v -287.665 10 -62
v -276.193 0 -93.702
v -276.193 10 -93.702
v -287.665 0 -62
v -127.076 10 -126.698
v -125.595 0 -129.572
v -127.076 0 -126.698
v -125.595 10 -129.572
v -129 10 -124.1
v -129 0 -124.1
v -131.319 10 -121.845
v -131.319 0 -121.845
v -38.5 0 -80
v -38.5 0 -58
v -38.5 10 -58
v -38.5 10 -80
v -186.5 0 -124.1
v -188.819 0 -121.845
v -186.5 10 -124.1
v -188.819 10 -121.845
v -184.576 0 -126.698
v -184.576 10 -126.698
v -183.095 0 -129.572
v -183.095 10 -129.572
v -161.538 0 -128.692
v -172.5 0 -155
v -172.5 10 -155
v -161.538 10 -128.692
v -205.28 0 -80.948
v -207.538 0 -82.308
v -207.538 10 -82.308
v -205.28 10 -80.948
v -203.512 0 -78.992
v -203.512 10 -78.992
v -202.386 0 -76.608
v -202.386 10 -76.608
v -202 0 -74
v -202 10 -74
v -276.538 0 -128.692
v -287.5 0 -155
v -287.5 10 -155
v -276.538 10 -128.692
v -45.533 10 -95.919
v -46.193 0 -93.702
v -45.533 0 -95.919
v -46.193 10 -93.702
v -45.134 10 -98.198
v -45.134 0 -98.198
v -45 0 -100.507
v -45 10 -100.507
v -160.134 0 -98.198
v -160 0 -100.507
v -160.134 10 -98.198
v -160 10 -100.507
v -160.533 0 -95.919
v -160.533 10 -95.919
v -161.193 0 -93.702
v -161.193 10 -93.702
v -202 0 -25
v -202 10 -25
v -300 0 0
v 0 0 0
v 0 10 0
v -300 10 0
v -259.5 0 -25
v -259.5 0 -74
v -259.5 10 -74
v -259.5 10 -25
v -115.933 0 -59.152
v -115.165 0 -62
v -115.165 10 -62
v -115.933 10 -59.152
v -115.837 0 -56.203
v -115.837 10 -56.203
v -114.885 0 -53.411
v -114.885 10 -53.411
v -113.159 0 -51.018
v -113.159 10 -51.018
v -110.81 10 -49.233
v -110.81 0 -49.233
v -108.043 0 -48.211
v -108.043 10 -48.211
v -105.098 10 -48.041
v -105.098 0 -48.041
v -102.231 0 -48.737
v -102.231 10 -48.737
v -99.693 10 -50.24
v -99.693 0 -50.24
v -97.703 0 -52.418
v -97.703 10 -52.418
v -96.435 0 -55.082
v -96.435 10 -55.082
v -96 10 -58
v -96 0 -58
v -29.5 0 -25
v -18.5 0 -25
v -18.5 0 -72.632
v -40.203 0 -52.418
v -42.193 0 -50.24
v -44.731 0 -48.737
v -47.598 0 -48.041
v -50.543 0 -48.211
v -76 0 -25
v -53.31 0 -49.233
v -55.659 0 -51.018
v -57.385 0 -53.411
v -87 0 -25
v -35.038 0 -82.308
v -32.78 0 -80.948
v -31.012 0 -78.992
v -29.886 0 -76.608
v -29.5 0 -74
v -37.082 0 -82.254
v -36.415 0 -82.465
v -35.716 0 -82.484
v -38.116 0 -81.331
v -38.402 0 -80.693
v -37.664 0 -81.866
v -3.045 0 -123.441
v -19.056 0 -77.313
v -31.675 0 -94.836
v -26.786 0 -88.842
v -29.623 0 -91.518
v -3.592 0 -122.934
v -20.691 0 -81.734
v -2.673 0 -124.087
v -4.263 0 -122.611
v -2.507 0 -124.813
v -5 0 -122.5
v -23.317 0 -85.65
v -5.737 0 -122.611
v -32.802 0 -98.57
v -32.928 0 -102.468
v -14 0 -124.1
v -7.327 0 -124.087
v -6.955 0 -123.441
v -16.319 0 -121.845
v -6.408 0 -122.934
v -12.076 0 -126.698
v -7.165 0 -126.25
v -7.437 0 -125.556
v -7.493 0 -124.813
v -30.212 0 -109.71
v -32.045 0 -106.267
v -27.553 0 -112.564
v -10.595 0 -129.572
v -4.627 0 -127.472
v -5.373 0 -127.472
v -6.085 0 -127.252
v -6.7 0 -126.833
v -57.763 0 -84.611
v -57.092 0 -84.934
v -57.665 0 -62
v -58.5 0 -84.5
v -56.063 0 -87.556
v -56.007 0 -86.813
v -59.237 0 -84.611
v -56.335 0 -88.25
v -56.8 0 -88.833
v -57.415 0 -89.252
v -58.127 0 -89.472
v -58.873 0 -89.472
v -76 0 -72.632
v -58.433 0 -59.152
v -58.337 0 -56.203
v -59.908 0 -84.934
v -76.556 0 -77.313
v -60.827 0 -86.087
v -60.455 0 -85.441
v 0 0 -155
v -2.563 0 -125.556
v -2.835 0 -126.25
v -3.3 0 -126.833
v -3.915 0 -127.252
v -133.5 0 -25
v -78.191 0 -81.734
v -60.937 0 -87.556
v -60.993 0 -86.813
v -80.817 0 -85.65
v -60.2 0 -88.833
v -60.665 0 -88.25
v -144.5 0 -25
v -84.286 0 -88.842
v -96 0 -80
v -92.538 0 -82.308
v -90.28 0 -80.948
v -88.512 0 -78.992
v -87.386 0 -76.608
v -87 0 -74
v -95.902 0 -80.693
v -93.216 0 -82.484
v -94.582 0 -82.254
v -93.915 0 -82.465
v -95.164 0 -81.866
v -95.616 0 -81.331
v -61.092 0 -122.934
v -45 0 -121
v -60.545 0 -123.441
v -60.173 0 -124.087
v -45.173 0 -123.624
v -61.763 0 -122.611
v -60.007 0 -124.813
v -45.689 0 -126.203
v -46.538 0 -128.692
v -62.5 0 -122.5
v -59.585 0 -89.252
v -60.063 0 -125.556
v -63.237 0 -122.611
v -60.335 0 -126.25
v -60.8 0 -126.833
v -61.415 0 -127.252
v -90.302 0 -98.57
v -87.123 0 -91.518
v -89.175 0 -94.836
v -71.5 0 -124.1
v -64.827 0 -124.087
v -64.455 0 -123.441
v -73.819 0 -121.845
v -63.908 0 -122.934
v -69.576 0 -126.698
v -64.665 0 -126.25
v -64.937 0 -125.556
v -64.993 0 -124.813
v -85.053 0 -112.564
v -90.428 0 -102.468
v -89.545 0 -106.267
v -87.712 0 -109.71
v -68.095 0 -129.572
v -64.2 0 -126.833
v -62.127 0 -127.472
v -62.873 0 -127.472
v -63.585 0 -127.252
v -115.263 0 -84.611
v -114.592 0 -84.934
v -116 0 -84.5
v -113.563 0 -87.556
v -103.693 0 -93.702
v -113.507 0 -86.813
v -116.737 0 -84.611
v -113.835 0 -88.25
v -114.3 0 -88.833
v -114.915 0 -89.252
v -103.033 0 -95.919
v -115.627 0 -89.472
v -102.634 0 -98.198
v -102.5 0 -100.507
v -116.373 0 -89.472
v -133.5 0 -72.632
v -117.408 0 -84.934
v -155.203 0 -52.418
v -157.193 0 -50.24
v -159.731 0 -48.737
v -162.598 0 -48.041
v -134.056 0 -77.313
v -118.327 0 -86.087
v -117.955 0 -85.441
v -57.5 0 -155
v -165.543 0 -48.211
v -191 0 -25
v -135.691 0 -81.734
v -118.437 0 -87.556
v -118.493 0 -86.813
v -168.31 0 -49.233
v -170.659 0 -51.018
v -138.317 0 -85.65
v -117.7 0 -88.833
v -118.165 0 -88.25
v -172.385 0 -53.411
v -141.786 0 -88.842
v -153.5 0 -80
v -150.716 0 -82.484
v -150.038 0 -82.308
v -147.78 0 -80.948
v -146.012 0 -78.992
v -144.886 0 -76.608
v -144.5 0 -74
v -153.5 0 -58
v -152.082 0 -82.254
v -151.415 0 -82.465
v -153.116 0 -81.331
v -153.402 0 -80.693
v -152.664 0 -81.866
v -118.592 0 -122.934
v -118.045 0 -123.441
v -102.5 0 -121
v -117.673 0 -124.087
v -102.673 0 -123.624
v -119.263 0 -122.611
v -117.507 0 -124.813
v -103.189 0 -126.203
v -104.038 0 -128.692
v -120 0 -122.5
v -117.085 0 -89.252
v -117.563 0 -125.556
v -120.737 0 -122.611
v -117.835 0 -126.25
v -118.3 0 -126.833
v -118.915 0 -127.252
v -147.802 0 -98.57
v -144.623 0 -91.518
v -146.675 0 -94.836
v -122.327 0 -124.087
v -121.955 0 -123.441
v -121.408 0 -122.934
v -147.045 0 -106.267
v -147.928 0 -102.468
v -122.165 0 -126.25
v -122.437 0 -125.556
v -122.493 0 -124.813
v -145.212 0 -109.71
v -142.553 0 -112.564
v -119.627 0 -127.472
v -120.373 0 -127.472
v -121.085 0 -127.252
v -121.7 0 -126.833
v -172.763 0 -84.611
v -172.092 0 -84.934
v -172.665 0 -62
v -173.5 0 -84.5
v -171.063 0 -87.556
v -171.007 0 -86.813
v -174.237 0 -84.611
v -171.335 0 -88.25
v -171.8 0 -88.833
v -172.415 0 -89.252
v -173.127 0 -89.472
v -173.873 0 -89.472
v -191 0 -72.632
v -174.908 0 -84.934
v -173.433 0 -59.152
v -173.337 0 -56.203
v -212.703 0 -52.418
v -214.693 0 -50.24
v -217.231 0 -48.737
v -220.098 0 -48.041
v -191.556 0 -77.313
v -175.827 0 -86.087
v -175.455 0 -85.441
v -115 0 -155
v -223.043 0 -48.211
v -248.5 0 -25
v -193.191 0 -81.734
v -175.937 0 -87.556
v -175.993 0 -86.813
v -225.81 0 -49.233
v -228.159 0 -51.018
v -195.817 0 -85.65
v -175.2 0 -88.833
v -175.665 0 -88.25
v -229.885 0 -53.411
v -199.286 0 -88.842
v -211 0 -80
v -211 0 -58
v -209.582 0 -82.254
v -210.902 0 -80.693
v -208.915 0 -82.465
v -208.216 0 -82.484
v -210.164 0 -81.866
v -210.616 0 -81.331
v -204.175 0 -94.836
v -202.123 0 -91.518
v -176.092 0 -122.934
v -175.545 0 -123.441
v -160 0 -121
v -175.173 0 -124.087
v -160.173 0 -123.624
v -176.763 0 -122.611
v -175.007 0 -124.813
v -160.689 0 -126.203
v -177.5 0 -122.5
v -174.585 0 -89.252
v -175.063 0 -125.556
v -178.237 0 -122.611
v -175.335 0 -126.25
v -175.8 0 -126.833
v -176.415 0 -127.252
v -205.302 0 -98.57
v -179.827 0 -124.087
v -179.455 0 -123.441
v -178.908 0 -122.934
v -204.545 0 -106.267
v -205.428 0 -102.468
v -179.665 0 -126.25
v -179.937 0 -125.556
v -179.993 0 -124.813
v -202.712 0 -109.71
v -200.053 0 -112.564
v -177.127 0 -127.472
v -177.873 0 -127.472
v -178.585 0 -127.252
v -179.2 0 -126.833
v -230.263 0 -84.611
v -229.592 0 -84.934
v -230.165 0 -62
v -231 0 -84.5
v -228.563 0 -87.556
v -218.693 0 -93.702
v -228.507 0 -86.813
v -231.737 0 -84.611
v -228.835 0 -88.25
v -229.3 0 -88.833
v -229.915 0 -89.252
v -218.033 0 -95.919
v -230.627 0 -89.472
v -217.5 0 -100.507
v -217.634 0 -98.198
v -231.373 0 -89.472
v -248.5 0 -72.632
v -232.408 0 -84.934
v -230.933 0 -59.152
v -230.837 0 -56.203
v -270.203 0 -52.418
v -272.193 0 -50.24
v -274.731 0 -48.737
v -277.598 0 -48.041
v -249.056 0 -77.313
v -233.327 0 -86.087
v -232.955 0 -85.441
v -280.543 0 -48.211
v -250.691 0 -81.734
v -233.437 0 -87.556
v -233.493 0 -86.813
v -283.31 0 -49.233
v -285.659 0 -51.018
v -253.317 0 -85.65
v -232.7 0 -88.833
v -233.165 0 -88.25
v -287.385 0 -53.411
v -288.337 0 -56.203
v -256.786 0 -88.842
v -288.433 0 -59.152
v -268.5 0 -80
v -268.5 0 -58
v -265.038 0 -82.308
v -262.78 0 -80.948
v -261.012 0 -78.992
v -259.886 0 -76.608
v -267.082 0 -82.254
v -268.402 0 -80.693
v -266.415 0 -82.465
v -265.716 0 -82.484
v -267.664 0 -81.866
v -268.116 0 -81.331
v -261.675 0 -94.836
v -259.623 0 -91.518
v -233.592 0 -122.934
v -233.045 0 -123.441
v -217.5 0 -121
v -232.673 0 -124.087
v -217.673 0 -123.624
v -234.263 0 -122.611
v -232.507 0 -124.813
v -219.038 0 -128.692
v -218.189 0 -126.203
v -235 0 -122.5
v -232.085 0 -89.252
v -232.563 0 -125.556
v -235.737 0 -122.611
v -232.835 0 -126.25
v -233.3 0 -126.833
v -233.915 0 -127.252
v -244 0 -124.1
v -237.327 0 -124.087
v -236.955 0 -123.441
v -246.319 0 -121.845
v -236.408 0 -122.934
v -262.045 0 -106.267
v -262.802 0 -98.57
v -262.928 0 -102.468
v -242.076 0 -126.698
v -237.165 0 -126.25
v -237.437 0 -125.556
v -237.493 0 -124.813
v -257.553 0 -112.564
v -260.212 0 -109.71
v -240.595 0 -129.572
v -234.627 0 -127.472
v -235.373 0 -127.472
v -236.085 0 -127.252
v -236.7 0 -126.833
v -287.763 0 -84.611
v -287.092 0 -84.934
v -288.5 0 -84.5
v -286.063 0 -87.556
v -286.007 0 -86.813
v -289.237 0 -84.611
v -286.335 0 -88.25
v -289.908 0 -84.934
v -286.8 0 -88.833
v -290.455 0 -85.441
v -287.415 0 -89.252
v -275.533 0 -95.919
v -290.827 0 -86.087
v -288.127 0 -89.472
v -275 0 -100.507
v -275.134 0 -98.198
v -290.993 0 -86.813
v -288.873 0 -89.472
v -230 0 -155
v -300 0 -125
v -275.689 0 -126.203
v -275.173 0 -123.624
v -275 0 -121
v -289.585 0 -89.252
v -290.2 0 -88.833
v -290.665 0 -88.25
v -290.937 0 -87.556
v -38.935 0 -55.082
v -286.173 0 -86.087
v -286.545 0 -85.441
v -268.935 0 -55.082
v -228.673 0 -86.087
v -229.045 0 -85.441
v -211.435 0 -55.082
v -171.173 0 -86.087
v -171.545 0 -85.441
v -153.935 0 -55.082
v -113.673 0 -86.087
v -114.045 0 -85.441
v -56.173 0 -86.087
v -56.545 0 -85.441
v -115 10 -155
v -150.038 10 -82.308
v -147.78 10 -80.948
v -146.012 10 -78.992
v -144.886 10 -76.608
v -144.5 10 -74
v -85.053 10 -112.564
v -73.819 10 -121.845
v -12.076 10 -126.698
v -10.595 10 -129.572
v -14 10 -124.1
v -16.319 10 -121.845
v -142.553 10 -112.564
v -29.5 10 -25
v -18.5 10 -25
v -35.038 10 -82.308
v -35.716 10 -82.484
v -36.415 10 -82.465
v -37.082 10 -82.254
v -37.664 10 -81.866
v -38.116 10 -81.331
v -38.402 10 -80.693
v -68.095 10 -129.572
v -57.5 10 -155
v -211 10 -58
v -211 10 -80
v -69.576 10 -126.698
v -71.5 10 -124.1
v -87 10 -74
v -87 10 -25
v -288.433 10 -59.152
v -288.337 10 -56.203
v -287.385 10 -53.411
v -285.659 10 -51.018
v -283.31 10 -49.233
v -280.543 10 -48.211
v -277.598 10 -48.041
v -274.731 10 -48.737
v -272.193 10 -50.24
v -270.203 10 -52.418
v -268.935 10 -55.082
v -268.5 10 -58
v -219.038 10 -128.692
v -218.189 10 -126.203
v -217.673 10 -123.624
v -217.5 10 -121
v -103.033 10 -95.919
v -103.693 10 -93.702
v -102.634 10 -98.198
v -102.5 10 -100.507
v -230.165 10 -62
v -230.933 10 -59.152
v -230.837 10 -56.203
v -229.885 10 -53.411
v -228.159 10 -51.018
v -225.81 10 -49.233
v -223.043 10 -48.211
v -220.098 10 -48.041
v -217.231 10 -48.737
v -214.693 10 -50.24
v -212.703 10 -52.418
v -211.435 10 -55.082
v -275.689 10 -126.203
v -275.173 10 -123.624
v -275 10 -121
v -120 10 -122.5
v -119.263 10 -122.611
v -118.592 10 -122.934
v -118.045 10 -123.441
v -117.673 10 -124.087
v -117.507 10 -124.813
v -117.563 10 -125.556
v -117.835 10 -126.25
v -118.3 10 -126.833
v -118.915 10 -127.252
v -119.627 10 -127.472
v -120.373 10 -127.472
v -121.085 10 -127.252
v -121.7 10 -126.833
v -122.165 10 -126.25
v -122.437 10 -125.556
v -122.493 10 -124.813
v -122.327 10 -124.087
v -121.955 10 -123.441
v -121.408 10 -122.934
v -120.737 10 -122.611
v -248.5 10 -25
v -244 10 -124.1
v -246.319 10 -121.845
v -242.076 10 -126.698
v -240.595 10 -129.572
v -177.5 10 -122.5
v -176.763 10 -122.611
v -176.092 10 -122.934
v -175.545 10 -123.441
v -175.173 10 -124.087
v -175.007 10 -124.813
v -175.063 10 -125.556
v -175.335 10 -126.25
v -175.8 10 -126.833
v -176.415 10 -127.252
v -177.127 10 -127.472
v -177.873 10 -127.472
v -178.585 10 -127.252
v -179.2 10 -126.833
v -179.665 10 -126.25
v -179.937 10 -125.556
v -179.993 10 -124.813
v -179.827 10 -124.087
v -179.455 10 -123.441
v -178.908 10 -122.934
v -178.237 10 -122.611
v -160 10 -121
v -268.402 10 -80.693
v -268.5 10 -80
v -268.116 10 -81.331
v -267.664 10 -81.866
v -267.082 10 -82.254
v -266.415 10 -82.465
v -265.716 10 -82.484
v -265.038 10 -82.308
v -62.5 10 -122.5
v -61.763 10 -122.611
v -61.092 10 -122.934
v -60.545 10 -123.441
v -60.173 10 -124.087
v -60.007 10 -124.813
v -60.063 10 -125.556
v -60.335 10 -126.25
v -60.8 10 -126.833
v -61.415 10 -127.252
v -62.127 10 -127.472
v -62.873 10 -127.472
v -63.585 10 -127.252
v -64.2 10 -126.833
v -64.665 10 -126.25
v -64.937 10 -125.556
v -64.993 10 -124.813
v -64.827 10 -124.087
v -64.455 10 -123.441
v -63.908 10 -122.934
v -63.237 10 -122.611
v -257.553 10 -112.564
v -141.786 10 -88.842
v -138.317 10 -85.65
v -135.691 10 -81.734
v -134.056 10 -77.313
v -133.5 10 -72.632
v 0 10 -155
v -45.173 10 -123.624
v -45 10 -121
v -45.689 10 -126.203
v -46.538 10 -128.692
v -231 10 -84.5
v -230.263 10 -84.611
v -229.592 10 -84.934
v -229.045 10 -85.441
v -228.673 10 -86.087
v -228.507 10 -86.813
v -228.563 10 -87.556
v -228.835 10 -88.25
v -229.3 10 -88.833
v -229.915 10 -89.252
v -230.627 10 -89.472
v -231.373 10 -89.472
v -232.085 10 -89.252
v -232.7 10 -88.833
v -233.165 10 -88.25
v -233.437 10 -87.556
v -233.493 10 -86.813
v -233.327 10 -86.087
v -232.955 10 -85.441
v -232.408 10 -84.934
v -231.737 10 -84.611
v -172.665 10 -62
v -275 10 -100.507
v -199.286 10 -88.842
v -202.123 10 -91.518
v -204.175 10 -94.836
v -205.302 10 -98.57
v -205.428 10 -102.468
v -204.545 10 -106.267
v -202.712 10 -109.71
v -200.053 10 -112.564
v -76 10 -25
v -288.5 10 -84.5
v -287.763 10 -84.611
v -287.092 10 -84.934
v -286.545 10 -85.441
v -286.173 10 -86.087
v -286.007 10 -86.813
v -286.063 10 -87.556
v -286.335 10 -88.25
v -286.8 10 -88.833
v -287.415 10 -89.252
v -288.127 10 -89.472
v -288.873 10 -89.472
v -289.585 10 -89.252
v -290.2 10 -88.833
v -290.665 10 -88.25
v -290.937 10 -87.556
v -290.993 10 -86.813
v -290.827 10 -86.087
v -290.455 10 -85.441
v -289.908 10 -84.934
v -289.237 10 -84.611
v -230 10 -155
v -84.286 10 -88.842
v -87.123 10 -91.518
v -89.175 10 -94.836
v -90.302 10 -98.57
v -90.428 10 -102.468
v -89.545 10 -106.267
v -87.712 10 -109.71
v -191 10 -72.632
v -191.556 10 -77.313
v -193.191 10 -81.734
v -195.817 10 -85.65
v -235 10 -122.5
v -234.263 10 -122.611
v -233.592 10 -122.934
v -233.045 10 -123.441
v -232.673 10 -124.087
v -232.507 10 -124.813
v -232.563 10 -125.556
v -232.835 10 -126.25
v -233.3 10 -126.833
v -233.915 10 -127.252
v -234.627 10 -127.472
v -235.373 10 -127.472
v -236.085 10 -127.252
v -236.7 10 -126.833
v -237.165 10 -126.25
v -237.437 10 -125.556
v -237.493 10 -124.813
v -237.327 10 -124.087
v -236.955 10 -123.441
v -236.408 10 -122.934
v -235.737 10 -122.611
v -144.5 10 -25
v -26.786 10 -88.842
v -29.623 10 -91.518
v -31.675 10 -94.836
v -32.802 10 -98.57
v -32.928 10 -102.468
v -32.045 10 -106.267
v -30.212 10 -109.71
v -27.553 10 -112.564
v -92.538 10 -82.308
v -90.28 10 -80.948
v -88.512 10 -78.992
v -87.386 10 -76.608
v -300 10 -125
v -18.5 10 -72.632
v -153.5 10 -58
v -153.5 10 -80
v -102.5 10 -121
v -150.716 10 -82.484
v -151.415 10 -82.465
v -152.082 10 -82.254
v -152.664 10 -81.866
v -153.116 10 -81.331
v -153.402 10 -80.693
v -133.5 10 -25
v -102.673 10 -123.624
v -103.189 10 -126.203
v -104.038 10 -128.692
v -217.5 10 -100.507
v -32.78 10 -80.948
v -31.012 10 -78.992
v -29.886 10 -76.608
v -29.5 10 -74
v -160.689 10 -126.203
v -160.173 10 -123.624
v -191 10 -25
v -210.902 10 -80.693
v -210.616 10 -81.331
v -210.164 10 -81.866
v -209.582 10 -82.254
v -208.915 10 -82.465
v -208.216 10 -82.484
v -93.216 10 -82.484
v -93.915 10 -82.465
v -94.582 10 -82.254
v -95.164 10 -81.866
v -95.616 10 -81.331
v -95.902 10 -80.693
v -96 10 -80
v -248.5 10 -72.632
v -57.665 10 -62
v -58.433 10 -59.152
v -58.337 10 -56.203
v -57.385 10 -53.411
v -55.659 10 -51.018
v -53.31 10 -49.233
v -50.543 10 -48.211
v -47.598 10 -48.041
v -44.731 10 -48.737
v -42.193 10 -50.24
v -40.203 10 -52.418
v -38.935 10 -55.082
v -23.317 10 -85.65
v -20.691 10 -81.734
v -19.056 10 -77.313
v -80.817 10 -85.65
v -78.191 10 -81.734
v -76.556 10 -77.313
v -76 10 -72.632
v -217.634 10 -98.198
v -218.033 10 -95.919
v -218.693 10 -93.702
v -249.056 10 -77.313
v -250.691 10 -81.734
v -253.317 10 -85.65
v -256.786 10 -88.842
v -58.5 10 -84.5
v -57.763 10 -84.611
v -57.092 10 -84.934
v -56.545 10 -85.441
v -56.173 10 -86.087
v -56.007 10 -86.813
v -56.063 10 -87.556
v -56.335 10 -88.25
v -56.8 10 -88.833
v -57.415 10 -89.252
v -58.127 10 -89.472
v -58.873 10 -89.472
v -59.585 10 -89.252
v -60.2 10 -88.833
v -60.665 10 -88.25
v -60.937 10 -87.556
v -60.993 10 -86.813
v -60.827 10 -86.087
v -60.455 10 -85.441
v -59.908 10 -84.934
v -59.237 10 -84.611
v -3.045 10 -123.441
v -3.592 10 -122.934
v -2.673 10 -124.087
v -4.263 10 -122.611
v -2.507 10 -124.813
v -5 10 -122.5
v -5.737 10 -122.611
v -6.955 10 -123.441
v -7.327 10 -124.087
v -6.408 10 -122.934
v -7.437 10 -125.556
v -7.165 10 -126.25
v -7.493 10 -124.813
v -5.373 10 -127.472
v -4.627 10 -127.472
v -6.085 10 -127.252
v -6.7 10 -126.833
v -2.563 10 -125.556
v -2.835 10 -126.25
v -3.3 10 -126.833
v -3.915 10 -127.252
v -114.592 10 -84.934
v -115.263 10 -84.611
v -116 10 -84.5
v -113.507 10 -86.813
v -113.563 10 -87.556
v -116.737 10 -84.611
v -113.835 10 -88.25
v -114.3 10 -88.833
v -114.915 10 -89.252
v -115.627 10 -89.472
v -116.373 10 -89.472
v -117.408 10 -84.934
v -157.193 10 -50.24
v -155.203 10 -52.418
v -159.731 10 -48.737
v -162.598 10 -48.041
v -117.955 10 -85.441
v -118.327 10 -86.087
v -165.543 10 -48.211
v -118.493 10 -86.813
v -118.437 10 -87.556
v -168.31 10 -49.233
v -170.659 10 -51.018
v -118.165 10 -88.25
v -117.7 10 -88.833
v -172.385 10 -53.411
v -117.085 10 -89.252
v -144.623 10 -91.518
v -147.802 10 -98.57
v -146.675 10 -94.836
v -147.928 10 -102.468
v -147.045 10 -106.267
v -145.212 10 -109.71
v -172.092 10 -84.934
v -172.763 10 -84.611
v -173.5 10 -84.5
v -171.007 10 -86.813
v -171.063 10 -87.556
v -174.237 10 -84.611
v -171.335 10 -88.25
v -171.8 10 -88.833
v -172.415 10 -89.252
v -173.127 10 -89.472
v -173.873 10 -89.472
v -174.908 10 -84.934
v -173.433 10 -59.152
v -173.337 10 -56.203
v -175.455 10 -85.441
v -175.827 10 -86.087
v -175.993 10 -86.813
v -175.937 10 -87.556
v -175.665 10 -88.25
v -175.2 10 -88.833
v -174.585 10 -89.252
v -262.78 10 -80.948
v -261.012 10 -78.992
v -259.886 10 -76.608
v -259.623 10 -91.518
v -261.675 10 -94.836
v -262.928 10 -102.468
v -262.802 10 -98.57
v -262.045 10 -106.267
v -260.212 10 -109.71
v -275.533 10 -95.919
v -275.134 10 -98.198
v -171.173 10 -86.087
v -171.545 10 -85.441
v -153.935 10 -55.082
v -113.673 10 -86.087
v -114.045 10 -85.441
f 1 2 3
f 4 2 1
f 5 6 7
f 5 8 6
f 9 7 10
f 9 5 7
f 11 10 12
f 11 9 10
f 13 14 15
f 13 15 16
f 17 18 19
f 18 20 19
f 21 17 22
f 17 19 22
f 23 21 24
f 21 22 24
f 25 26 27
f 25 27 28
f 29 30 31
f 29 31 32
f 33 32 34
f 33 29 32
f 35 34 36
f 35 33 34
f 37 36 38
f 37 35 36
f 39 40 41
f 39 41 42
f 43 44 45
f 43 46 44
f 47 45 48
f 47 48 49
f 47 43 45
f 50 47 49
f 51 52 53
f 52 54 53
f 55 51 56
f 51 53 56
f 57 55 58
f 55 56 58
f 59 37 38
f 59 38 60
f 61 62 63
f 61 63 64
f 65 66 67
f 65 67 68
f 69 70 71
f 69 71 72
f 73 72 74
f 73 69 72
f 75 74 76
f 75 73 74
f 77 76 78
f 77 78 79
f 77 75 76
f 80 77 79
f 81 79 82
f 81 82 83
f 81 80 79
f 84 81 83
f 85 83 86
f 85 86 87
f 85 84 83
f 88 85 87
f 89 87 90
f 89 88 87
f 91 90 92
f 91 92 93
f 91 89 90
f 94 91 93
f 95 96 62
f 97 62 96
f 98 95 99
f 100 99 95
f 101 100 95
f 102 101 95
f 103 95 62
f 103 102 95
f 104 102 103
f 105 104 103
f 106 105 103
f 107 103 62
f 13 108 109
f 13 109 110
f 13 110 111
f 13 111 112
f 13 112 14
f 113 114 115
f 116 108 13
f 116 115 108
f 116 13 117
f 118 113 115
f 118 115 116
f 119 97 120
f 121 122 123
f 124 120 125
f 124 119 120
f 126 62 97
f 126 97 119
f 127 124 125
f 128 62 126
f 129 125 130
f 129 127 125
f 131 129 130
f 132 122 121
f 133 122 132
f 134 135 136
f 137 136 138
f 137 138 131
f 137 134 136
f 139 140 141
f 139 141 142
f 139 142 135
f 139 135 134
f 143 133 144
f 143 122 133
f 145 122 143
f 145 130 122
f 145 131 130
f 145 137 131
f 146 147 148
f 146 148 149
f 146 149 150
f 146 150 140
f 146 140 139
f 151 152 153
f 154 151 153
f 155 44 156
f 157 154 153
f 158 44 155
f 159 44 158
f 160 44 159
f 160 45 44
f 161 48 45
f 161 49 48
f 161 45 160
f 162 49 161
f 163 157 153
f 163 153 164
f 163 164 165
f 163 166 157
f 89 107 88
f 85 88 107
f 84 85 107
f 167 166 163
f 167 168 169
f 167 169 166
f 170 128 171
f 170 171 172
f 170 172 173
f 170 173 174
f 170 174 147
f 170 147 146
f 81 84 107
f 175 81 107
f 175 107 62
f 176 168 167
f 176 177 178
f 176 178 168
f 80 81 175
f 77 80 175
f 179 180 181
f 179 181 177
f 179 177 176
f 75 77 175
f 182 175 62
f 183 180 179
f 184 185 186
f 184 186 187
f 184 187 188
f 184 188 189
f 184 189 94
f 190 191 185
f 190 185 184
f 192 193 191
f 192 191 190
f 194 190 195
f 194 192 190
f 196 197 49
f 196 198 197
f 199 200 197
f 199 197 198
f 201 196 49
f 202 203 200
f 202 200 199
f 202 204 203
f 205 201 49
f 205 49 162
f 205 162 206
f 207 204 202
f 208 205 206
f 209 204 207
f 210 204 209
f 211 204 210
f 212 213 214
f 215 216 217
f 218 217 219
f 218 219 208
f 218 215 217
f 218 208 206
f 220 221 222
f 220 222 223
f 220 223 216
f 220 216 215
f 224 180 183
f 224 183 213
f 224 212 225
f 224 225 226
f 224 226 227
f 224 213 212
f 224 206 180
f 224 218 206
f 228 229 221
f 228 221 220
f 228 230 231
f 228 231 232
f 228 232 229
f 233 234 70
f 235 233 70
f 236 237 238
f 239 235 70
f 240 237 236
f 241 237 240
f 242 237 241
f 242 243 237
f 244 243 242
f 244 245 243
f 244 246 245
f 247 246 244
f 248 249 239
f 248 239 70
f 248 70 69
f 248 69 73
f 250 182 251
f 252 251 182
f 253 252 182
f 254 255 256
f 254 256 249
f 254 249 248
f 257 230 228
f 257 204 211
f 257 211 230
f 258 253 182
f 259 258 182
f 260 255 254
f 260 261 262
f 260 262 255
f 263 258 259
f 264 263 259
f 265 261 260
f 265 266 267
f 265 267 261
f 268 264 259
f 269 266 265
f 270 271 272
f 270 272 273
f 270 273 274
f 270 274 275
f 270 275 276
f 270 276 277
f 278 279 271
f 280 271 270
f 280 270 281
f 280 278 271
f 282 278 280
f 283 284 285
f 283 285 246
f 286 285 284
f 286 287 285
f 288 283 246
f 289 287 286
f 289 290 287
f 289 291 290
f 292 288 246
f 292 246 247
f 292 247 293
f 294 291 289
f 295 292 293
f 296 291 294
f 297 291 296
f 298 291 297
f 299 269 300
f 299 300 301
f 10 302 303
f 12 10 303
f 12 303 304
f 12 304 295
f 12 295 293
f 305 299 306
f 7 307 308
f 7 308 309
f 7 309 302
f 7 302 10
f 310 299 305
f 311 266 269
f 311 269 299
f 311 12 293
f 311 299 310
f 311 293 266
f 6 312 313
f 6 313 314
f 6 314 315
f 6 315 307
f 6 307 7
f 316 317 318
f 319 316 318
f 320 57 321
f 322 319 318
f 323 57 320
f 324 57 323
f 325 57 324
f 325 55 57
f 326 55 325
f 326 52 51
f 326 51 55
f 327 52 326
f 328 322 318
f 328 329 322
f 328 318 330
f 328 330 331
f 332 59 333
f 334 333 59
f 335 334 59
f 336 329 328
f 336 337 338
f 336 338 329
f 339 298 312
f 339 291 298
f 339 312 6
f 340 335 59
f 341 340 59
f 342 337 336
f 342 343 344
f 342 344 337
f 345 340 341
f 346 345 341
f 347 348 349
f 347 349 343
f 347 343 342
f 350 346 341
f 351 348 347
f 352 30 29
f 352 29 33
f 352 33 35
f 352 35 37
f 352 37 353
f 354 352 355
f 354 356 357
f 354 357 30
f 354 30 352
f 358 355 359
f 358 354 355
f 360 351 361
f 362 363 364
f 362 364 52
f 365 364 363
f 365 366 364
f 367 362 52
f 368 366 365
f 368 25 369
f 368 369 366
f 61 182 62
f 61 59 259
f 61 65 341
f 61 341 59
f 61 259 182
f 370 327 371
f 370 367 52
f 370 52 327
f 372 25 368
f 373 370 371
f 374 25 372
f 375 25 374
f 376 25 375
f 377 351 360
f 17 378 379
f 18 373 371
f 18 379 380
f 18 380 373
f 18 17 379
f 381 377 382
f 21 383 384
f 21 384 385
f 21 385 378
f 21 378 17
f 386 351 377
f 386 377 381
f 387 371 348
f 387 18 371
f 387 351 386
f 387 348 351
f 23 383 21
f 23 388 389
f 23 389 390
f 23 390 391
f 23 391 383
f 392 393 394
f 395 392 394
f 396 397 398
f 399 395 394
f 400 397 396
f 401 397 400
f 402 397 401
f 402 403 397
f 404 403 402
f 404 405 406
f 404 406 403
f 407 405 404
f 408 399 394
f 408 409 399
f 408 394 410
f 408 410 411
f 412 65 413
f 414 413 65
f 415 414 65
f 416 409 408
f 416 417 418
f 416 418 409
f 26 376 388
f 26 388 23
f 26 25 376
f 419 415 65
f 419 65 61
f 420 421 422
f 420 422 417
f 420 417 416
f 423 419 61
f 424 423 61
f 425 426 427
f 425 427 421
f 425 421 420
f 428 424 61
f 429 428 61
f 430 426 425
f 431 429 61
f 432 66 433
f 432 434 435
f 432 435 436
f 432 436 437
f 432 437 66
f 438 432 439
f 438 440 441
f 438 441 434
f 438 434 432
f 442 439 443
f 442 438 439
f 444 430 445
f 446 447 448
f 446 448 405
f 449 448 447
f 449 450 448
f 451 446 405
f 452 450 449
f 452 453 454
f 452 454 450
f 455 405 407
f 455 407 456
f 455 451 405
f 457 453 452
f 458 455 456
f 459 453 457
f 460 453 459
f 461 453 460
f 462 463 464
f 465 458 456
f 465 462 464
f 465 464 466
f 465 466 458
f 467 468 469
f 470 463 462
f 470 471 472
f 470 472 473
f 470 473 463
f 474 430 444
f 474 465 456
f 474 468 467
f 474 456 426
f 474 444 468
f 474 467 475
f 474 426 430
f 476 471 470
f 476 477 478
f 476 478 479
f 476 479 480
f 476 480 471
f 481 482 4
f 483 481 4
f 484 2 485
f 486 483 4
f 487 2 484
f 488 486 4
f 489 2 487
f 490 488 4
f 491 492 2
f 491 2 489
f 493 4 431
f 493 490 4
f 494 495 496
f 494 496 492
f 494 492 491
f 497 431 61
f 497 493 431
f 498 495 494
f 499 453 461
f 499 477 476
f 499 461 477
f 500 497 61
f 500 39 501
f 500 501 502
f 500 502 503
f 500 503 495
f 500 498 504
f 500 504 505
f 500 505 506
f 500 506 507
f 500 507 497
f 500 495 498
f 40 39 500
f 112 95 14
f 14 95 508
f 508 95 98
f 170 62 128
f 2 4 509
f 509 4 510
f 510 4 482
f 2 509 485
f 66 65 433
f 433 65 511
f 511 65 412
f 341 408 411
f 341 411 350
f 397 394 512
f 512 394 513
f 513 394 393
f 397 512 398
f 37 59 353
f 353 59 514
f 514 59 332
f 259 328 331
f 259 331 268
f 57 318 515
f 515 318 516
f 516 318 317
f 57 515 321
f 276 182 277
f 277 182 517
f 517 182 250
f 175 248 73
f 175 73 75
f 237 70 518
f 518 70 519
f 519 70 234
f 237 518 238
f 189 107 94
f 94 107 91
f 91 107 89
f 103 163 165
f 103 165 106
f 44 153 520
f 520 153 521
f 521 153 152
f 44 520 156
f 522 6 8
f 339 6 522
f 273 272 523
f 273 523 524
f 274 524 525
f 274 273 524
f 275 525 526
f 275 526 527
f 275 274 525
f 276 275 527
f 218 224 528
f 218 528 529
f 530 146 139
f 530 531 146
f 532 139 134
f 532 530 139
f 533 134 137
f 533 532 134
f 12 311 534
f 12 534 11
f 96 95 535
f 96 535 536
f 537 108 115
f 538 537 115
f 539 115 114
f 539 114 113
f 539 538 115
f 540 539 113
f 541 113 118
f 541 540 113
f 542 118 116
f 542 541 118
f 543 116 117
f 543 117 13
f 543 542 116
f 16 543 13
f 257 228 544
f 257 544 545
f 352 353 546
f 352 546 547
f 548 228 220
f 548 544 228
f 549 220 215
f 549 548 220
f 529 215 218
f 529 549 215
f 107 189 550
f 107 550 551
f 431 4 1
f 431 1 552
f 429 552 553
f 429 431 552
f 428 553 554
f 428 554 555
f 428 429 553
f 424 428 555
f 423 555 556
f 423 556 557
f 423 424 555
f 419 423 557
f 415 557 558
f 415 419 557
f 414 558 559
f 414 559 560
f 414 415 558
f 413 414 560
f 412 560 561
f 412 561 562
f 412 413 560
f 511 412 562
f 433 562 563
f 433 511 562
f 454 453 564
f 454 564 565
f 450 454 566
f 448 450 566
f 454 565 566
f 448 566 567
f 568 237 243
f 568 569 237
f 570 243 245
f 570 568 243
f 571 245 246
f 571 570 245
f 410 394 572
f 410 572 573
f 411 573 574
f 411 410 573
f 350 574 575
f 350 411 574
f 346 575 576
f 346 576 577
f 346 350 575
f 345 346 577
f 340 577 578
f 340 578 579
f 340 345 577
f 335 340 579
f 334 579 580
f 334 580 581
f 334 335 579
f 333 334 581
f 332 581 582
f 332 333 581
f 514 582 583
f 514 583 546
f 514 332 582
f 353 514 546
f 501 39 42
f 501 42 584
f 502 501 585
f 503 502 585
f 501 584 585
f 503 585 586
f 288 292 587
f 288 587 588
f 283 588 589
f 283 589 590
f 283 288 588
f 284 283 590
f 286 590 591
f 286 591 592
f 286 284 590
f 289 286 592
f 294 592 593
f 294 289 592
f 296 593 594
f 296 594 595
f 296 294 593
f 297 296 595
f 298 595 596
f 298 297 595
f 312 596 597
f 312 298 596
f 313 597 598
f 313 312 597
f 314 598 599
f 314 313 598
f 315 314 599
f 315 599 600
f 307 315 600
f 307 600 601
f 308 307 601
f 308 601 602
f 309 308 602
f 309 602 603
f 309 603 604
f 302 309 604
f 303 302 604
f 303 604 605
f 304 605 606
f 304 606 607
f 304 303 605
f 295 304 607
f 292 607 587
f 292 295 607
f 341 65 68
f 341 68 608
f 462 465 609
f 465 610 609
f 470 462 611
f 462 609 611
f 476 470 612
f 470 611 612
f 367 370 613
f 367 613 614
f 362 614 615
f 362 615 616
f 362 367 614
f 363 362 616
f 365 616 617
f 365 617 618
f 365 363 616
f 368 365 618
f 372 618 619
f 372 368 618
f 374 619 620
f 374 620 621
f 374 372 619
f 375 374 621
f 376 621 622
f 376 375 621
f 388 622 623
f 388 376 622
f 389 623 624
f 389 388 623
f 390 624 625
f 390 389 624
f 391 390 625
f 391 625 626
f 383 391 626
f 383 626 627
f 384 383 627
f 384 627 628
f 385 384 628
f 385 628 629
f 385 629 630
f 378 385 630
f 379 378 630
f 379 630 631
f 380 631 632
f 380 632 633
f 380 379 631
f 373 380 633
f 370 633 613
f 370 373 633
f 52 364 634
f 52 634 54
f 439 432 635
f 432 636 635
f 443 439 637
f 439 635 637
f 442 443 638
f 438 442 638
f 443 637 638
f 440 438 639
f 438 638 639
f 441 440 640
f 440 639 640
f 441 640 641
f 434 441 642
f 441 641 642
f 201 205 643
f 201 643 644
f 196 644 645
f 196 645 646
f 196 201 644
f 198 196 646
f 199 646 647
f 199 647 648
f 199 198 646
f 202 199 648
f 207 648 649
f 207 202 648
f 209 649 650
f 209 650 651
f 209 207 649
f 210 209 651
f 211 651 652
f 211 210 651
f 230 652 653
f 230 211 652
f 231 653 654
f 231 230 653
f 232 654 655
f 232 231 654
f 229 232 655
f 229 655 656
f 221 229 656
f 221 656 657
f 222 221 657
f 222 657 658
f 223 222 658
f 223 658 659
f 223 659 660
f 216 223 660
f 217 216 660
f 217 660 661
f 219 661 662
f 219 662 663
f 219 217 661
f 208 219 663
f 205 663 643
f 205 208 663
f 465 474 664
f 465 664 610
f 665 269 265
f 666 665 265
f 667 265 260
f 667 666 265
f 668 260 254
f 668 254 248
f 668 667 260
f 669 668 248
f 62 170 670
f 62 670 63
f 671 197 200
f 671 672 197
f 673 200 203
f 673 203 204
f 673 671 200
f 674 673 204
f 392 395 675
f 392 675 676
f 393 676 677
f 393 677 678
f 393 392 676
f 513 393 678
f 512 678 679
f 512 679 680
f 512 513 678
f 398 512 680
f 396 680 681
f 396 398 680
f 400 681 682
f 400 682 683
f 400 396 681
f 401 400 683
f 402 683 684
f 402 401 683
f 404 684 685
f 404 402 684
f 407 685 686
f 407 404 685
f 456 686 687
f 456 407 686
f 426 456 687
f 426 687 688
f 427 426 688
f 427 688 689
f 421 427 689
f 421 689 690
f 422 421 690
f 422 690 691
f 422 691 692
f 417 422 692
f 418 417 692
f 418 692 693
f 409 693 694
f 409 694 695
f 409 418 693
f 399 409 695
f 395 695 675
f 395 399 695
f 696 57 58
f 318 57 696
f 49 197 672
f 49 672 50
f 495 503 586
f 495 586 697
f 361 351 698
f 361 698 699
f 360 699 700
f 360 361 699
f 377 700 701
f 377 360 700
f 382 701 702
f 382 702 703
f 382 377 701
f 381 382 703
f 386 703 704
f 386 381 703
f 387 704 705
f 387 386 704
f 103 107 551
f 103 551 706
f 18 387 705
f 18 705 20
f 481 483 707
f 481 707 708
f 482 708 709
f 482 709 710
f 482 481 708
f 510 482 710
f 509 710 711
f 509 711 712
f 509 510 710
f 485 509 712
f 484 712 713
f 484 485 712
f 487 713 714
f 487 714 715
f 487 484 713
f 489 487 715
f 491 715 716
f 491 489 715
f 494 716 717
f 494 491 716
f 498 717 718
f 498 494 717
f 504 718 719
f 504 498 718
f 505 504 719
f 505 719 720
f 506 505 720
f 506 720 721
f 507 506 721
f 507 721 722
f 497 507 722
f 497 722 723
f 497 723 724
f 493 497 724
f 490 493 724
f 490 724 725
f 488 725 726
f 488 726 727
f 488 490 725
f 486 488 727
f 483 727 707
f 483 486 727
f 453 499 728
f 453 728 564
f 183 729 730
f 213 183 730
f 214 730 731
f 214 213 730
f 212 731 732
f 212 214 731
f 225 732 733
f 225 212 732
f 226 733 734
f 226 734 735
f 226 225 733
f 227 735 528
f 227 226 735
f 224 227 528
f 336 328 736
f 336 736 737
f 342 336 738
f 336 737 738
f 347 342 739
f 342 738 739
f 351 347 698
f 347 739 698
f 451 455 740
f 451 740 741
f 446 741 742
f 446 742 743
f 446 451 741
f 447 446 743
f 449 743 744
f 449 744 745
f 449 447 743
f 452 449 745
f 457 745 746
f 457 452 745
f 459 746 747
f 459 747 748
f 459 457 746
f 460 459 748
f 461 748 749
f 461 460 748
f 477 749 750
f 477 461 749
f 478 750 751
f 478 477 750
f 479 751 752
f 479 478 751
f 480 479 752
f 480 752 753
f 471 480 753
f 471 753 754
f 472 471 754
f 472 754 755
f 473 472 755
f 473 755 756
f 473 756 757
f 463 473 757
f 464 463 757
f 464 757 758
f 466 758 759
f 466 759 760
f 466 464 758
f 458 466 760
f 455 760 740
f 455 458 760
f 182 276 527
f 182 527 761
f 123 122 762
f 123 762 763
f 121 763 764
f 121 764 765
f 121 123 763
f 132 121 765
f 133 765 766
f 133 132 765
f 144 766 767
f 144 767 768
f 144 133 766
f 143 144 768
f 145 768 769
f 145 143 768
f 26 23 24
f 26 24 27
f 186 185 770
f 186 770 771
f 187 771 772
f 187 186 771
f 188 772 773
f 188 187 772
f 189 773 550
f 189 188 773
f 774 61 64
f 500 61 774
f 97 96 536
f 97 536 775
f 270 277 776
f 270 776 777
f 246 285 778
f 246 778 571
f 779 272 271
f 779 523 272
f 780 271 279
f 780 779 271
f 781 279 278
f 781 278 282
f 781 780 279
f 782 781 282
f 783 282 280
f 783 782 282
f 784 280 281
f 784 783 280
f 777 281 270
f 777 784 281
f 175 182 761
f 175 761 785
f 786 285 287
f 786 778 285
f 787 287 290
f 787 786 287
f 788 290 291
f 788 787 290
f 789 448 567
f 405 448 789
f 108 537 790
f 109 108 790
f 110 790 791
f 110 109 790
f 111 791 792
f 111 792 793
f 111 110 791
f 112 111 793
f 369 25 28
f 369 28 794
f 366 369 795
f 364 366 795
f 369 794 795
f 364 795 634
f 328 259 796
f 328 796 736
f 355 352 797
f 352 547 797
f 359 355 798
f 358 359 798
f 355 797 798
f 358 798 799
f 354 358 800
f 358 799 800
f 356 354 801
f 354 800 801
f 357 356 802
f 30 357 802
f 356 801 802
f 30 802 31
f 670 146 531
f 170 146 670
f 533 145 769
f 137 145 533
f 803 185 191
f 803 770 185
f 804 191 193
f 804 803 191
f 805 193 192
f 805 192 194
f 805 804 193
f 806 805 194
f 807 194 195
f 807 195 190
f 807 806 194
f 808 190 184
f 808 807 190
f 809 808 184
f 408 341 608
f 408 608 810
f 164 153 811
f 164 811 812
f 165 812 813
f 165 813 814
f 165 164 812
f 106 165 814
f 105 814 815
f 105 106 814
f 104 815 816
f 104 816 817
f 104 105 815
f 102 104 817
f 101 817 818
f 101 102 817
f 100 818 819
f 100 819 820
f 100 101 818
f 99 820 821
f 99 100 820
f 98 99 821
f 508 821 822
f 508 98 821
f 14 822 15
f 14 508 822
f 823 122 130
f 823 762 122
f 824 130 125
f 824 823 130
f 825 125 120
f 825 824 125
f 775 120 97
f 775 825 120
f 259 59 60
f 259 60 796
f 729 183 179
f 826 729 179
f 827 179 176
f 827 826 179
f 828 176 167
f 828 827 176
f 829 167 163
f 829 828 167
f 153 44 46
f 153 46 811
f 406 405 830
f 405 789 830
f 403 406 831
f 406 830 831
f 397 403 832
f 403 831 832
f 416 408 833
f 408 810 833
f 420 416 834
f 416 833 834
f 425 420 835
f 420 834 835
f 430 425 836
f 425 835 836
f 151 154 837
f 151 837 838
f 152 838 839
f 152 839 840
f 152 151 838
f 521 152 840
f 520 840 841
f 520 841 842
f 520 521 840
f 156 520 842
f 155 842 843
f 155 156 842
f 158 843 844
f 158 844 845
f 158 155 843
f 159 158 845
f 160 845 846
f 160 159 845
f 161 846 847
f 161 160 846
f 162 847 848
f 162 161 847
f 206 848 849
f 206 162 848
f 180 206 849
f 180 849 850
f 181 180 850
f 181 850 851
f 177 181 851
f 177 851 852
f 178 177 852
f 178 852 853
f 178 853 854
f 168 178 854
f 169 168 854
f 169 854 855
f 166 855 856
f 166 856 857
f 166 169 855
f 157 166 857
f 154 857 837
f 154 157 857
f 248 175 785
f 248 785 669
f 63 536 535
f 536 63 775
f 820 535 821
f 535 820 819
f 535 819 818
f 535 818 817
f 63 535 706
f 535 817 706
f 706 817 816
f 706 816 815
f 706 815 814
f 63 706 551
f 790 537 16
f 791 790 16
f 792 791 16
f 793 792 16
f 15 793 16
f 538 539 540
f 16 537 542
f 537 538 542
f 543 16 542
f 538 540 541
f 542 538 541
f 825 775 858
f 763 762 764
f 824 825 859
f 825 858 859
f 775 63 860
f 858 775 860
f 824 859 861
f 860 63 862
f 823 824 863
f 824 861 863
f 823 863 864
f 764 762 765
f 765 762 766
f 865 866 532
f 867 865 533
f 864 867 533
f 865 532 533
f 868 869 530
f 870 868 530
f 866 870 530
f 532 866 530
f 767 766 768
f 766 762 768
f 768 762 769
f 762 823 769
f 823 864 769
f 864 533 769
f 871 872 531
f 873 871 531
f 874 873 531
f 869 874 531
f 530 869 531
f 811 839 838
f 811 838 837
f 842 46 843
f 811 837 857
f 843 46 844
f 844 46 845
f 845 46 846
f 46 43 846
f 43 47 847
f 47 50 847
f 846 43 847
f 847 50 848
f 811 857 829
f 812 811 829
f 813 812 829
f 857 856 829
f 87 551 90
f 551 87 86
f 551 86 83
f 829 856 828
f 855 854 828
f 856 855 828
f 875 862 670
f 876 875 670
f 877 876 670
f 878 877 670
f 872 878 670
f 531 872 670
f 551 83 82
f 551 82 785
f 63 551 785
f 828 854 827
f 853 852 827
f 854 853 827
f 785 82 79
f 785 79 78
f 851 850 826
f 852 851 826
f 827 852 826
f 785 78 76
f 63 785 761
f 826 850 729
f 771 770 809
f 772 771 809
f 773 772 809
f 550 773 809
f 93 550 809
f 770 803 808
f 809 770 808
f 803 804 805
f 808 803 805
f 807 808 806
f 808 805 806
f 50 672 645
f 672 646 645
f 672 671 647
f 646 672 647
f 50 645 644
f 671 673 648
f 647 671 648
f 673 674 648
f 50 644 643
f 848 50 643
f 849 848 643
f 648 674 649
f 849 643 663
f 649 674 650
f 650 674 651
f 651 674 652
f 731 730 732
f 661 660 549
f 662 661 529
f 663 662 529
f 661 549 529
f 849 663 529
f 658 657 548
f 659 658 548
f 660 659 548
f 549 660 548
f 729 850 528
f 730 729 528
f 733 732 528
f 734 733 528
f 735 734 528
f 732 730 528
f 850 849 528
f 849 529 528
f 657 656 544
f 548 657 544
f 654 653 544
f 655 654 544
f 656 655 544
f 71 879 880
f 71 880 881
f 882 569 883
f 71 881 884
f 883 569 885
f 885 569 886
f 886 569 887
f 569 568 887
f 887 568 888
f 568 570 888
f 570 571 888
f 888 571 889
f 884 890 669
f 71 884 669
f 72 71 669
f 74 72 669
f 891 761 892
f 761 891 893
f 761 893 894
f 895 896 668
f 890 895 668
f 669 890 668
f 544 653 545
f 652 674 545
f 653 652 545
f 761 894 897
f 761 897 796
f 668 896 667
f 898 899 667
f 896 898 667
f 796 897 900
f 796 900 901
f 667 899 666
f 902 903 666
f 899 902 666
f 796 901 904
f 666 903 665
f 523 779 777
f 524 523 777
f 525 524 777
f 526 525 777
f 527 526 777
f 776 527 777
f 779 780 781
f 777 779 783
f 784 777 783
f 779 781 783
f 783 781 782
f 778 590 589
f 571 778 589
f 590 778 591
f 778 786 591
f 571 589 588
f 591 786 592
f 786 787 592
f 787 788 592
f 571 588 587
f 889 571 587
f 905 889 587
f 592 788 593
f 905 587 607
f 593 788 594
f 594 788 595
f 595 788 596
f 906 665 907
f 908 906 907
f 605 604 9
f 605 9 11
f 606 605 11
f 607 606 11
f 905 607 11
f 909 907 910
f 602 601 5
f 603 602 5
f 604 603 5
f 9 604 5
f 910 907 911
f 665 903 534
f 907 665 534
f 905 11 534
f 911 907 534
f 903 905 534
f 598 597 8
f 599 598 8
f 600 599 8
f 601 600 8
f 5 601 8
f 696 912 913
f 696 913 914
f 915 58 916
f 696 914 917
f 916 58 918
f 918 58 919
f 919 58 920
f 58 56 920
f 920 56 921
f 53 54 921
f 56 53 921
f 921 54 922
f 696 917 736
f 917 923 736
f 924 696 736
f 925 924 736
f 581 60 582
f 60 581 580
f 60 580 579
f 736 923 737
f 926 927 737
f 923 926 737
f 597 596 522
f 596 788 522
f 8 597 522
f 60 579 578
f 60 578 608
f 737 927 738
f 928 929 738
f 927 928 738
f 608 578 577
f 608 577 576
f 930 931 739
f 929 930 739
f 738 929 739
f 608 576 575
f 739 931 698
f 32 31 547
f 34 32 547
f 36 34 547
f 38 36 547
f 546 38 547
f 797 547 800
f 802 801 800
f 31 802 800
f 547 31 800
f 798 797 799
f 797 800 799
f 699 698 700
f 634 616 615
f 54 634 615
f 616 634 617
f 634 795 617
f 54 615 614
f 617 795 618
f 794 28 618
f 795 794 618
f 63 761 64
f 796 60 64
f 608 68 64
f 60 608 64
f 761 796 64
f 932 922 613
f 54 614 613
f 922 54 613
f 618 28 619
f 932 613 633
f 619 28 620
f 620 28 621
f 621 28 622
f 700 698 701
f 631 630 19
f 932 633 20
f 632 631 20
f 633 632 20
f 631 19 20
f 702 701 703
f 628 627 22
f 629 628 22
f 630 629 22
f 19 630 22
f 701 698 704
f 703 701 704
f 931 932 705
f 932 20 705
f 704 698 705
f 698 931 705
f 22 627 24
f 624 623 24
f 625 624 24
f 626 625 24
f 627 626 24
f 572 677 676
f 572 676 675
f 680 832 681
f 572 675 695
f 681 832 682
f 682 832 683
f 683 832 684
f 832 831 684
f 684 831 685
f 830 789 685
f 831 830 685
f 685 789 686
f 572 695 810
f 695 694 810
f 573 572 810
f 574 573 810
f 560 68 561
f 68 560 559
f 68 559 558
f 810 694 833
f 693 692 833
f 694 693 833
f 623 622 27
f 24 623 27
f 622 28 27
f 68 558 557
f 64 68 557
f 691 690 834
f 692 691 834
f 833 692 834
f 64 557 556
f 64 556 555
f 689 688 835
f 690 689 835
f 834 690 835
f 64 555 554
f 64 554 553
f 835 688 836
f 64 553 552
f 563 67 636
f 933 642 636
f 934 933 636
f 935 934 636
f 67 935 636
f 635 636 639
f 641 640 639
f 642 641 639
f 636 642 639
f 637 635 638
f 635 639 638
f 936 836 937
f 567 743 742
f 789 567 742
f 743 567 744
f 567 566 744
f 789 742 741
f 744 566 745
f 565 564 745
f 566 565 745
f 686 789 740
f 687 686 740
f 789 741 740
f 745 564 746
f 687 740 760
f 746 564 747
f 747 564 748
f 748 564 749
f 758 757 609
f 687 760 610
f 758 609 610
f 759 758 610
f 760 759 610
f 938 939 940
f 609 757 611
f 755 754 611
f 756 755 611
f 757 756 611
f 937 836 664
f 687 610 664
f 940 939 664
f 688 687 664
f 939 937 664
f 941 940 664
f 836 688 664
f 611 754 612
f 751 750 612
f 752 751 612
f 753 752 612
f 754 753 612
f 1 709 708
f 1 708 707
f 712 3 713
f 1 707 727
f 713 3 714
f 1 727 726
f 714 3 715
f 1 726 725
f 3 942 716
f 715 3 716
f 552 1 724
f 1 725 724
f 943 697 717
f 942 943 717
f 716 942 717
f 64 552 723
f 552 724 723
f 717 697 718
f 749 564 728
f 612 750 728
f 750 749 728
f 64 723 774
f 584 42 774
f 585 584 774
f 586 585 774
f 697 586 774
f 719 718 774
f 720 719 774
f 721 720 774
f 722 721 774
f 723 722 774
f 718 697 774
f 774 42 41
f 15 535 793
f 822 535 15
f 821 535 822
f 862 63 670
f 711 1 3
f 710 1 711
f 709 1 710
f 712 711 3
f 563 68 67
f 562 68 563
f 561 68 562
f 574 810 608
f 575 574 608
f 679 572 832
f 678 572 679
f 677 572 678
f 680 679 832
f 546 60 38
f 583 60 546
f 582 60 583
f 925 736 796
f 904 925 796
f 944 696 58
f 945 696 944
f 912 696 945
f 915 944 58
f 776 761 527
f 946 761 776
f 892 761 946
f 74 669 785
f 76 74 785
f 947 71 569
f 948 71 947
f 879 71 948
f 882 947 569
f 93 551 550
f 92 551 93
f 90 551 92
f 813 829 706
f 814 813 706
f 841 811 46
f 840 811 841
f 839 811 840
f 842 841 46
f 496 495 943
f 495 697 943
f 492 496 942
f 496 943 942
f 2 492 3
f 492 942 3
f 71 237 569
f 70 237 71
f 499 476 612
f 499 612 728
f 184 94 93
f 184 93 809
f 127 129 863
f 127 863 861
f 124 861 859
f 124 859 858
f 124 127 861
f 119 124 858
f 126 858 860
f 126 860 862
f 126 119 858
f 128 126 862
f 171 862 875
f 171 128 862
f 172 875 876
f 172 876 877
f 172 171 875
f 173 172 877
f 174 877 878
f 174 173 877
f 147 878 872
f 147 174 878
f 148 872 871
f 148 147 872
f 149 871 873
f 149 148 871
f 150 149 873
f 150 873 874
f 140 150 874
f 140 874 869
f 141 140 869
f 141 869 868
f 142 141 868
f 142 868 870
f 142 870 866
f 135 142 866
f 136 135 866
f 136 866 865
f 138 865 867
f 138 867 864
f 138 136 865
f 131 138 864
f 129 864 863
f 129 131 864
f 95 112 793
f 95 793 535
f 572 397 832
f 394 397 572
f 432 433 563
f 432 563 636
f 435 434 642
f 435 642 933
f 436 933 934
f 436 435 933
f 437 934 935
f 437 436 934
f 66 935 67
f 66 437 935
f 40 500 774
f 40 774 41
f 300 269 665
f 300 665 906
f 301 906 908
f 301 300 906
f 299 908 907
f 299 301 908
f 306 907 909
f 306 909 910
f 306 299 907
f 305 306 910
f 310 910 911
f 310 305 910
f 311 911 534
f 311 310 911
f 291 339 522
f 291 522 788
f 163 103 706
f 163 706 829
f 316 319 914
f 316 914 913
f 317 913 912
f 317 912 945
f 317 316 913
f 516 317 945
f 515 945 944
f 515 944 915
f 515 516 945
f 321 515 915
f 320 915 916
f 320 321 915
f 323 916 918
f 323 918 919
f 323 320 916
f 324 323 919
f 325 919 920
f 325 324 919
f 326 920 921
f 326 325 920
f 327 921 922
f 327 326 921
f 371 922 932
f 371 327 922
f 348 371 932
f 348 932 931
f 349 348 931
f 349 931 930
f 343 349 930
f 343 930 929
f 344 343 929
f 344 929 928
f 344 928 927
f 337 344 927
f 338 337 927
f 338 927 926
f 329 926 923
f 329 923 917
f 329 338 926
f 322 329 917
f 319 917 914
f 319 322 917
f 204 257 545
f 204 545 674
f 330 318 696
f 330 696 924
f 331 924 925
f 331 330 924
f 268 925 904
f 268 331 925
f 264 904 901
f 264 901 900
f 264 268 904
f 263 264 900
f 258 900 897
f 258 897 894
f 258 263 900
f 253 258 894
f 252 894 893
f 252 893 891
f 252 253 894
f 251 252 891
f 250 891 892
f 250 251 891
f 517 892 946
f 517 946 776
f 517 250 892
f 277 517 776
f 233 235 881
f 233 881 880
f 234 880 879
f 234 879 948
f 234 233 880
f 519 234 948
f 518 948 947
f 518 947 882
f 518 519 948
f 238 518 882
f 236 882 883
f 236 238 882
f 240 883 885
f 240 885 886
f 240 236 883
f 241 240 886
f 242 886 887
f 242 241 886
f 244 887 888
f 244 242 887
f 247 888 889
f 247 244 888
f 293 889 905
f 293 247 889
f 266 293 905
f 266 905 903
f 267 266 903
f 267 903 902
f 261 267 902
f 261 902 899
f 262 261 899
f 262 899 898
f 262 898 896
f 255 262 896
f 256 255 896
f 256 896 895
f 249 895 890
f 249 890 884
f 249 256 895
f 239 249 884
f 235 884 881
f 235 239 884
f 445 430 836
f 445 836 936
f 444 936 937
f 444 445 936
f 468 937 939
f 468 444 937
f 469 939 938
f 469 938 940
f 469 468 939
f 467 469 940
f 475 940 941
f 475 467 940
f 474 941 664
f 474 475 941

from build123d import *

# Parameters (mm, degrees)
SKETCH1_R           = 2.5
BOSS_EXTRUDE1_DEPTH = 10
FILLET1_R           = 20
FILLET2_R           = 2.5


with BuildPart() as part:
    # Sketch1 → Boss-Extrude1 (new body)
    with BuildSketch(Plane(origin=(0, 0, 0), x_dir=(1, 0, 0), z_dir=(0, 1, 0))):
        with BuildLine():
            Line((0, 0), (-300, 0))
            Line((-300, 0), (-300, 125))
            Line((-300, 125), (-287.5, 155))
            Line((-287.5, 155), (-275, 125))
            Line((-275, 125), (-275, 97))
            Line((-275, 97), (-287.66515139, 62))
            ThreePointArc((-287.66515139, 62), (-280.543096437, 48.210936871), (-268.5, 58))
            Line((-268.5, 58), (-268.5, 83))
            ThreePointArc((-268.5, 83), (-262.136038969, 80.363961031), (-259.5, 74))
            Line((-259.5, 74), (-259.5, 25))
            Line((-259.5, 25), (-248.5, 25))
            Line((-248.5, 25), (-248.5, 86.008335649))
            ThreePointArc((-248.5, 86.008335649), (-262.197622342, 96.159801673), (-257.553360344, 112.564311745))
            Line((-257.553360344, 112.564311745), (-242.5, 125))
            Line((-242.5, 125), (-230, 155))
            Line((-230, 155), (-217.5, 125))
            Line((-217.5, 125), (-217.5, 97))
            Line((-217.5, 97), (-230.16515139, 62))
            ThreePointArc((-230.16515139, 62), (-223.043096437, 48.210936871), (-211, 58))
            Line((-211, 58), (-211, 83))
            ThreePointArc((-211, 83), (-204.636038969, 80.363961031), (-202, 74))
            Line((-202, 74), (-202, 25))
            Line((-202, 25), (-191, 25))
            Line((-191, 25), (-191, 86.008335649))
            ThreePointArc((-191, 86.008335649), (-204.697622342, 96.159801673), (-200.053360344, 112.564311745))
            Line((-200.053360344, 112.564311745), (-185, 125))
            Line((-185, 125), (-172.5, 155))
            Line((-172.5, 155), (-160, 125))
            Line((-160, 125), (-160, 97))
            Line((-160, 97), (-172.66515139, 62))
            ThreePointArc((-172.66515139, 62), (-165.543096437, 48.210936871), (-153.5, 58))
            Line((-153.5, 58), (-153.5, 83))
            ThreePointArc((-153.5, 83), (-147.136038969, 80.363961031), (-144.5, 74))
            Line((-144.5, 74), (-144.5, 25))
            Line((-144.5, 25), (-133.5, 25))
            Line((-133.5, 25), (-133.5, 86.008335649))
            ThreePointArc((-133.5, 86.008335649), (-147.197622342, 96.159801673), (-142.553360344, 112.564311745))
            Line((-142.553360344, 112.564311745), (-127.5, 125))
            Line((-127.5, 125), (-115, 155))
            Line((-115, 155), (-102.5, 125))
            Line((-102.5, 125), (-102.5, 97))
            Line((-102.5, 97), (-115.16515139, 62))
            ThreePointArc((-115.16515139, 62), (-108.043096437, 48.210936871), (-96, 58))
            Line((-96, 58), (-96, 83))
            ThreePointArc((-96, 83), (-89.636038969, 80.363961031), (-87, 74))
            Line((-87, 74), (-87, 25))
            Line((-87, 25), (-76, 25))
            Line((-76, 25), (-76, 86.008335649))
            ThreePointArc((-76, 86.008335649), (-89.697622342, 96.159801673), (-85.053360344, 112.564311745))
            Line((-85.053360344, 112.564311745), (-70, 125))
            Line((-70, 125), (-57.5, 155))
            Line((-57.5, 155), (-45, 125))
            Line((-45, 125), (-45, 97))
            Line((-45, 97), (-57.66515139, 62))
            ThreePointArc((-57.66515139, 62), (-50.543096437, 48.210936871), (-38.5, 58))
            Line((-38.5, 58), (-38.5, 83))
            ThreePointArc((-38.5, 83), (-32.136038969, 80.363961031), (-29.5, 74))
            Line((-29.5, 74), (-29.5, 25))
            Line((-29.5, 25), (-18.5, 25))
            Line((-18.5, 25), (-18.5, 86.008335649))
            ThreePointArc((-18.5, 86.008335649), (-32.197622342, 96.159801673), (-27.553360344, 112.564311745))
            Line((-27.553360344, 112.564311745), (-12.5, 125))
            Line((-12.5, 125), (0, 155))
            Line((0, 155), (0, 0))
        make_face()
        with Locations(Location((-5, 125, 0), (0, 0, 270))):
            Circle(SKETCH1_R, mode=Mode.SUBTRACT)
        with Locations(Location((-58.5, 87, 0), (0, 0, 270))):
            Circle(SKETCH1_R, mode=Mode.SUBTRACT)
        with Locations(Location((-62.5, 125, 0), (0, 0, 270))):
            Circle(SKETCH1_R, mode=Mode.SUBTRACT)
        with Locations(Location((-116, 87, 0), (0, 0, 270))):
            Circle(SKETCH1_R, mode=Mode.SUBTRACT)
        with Locations(Location((-120, 125, 0), (0, 0, 270))):
            Circle(SKETCH1_R, mode=Mode.SUBTRACT)
        with Locations(Location((-173.5, 87, 0), (0, 0, 270))):
            Circle(SKETCH1_R, mode=Mode.SUBTRACT)
        with Locations(Location((-177.5, 125, 0), (0, 0, 270))):
            Circle(SKETCH1_R, mode=Mode.SUBTRACT)
        with Locations(Location((-231, 87, 0), (0, 0, 270))):
            Circle(SKETCH1_R, mode=Mode.SUBTRACT)
        with Locations(Location((-235, 125, 0), (0, 0, 270))):
            Circle(SKETCH1_R, mode=Mode.SUBTRACT)
        with Locations(Location((-288.5, 87, 0), (0, 0, 270))):
            Circle(SKETCH1_R, mode=Mode.SUBTRACT)
    extrude(amount=BOSS_EXTRUDE1_DEPTH)

    # Fillet1
    fillet1_edges = [part.edges().sort_by_distance(p)[0] for p in [
        (-275, 5, -125),
        (-275, 5, -97),
        (-248.5, 5, -86.008335649),
        (-242.5, 5, -125),
        (-217.5, 5, -125),
        (-217.5, 5, -97),
        (-191, 5, -86.008335649),
        (-185, 5, -125),
        (-160, 5, -125),
        (-160, 5, -97),
        (-133.5, 5, -86.008335649),
        (-127.5, 5, -125),
        (-102.5, 5, -125),
        (-102.5, 5, -97),
        (-76, 5, -86.008335649),
        (-70, 5, -125),
        (-45, 5, -125),
        (-45, 5, -97),
        (-18.5, 5, -86.008335649),
        (-12.5, 5, -125),
    ]]
    fillet(fillet1_edges, radius=FILLET1_R)

    # Fillet2
    fillet2_edges = [part.edges().sort_by_distance(p)[0] for p in [
        (-268.5, 5, -83),
        (-211, 5, -83),
        (-153.5, 5, -83),
        (-96, 5, -83),
        (-38.5, 5, -83),
    ]]
    fillet(fillet2_edges, radius=FILLET2_R)


solid = part.part
